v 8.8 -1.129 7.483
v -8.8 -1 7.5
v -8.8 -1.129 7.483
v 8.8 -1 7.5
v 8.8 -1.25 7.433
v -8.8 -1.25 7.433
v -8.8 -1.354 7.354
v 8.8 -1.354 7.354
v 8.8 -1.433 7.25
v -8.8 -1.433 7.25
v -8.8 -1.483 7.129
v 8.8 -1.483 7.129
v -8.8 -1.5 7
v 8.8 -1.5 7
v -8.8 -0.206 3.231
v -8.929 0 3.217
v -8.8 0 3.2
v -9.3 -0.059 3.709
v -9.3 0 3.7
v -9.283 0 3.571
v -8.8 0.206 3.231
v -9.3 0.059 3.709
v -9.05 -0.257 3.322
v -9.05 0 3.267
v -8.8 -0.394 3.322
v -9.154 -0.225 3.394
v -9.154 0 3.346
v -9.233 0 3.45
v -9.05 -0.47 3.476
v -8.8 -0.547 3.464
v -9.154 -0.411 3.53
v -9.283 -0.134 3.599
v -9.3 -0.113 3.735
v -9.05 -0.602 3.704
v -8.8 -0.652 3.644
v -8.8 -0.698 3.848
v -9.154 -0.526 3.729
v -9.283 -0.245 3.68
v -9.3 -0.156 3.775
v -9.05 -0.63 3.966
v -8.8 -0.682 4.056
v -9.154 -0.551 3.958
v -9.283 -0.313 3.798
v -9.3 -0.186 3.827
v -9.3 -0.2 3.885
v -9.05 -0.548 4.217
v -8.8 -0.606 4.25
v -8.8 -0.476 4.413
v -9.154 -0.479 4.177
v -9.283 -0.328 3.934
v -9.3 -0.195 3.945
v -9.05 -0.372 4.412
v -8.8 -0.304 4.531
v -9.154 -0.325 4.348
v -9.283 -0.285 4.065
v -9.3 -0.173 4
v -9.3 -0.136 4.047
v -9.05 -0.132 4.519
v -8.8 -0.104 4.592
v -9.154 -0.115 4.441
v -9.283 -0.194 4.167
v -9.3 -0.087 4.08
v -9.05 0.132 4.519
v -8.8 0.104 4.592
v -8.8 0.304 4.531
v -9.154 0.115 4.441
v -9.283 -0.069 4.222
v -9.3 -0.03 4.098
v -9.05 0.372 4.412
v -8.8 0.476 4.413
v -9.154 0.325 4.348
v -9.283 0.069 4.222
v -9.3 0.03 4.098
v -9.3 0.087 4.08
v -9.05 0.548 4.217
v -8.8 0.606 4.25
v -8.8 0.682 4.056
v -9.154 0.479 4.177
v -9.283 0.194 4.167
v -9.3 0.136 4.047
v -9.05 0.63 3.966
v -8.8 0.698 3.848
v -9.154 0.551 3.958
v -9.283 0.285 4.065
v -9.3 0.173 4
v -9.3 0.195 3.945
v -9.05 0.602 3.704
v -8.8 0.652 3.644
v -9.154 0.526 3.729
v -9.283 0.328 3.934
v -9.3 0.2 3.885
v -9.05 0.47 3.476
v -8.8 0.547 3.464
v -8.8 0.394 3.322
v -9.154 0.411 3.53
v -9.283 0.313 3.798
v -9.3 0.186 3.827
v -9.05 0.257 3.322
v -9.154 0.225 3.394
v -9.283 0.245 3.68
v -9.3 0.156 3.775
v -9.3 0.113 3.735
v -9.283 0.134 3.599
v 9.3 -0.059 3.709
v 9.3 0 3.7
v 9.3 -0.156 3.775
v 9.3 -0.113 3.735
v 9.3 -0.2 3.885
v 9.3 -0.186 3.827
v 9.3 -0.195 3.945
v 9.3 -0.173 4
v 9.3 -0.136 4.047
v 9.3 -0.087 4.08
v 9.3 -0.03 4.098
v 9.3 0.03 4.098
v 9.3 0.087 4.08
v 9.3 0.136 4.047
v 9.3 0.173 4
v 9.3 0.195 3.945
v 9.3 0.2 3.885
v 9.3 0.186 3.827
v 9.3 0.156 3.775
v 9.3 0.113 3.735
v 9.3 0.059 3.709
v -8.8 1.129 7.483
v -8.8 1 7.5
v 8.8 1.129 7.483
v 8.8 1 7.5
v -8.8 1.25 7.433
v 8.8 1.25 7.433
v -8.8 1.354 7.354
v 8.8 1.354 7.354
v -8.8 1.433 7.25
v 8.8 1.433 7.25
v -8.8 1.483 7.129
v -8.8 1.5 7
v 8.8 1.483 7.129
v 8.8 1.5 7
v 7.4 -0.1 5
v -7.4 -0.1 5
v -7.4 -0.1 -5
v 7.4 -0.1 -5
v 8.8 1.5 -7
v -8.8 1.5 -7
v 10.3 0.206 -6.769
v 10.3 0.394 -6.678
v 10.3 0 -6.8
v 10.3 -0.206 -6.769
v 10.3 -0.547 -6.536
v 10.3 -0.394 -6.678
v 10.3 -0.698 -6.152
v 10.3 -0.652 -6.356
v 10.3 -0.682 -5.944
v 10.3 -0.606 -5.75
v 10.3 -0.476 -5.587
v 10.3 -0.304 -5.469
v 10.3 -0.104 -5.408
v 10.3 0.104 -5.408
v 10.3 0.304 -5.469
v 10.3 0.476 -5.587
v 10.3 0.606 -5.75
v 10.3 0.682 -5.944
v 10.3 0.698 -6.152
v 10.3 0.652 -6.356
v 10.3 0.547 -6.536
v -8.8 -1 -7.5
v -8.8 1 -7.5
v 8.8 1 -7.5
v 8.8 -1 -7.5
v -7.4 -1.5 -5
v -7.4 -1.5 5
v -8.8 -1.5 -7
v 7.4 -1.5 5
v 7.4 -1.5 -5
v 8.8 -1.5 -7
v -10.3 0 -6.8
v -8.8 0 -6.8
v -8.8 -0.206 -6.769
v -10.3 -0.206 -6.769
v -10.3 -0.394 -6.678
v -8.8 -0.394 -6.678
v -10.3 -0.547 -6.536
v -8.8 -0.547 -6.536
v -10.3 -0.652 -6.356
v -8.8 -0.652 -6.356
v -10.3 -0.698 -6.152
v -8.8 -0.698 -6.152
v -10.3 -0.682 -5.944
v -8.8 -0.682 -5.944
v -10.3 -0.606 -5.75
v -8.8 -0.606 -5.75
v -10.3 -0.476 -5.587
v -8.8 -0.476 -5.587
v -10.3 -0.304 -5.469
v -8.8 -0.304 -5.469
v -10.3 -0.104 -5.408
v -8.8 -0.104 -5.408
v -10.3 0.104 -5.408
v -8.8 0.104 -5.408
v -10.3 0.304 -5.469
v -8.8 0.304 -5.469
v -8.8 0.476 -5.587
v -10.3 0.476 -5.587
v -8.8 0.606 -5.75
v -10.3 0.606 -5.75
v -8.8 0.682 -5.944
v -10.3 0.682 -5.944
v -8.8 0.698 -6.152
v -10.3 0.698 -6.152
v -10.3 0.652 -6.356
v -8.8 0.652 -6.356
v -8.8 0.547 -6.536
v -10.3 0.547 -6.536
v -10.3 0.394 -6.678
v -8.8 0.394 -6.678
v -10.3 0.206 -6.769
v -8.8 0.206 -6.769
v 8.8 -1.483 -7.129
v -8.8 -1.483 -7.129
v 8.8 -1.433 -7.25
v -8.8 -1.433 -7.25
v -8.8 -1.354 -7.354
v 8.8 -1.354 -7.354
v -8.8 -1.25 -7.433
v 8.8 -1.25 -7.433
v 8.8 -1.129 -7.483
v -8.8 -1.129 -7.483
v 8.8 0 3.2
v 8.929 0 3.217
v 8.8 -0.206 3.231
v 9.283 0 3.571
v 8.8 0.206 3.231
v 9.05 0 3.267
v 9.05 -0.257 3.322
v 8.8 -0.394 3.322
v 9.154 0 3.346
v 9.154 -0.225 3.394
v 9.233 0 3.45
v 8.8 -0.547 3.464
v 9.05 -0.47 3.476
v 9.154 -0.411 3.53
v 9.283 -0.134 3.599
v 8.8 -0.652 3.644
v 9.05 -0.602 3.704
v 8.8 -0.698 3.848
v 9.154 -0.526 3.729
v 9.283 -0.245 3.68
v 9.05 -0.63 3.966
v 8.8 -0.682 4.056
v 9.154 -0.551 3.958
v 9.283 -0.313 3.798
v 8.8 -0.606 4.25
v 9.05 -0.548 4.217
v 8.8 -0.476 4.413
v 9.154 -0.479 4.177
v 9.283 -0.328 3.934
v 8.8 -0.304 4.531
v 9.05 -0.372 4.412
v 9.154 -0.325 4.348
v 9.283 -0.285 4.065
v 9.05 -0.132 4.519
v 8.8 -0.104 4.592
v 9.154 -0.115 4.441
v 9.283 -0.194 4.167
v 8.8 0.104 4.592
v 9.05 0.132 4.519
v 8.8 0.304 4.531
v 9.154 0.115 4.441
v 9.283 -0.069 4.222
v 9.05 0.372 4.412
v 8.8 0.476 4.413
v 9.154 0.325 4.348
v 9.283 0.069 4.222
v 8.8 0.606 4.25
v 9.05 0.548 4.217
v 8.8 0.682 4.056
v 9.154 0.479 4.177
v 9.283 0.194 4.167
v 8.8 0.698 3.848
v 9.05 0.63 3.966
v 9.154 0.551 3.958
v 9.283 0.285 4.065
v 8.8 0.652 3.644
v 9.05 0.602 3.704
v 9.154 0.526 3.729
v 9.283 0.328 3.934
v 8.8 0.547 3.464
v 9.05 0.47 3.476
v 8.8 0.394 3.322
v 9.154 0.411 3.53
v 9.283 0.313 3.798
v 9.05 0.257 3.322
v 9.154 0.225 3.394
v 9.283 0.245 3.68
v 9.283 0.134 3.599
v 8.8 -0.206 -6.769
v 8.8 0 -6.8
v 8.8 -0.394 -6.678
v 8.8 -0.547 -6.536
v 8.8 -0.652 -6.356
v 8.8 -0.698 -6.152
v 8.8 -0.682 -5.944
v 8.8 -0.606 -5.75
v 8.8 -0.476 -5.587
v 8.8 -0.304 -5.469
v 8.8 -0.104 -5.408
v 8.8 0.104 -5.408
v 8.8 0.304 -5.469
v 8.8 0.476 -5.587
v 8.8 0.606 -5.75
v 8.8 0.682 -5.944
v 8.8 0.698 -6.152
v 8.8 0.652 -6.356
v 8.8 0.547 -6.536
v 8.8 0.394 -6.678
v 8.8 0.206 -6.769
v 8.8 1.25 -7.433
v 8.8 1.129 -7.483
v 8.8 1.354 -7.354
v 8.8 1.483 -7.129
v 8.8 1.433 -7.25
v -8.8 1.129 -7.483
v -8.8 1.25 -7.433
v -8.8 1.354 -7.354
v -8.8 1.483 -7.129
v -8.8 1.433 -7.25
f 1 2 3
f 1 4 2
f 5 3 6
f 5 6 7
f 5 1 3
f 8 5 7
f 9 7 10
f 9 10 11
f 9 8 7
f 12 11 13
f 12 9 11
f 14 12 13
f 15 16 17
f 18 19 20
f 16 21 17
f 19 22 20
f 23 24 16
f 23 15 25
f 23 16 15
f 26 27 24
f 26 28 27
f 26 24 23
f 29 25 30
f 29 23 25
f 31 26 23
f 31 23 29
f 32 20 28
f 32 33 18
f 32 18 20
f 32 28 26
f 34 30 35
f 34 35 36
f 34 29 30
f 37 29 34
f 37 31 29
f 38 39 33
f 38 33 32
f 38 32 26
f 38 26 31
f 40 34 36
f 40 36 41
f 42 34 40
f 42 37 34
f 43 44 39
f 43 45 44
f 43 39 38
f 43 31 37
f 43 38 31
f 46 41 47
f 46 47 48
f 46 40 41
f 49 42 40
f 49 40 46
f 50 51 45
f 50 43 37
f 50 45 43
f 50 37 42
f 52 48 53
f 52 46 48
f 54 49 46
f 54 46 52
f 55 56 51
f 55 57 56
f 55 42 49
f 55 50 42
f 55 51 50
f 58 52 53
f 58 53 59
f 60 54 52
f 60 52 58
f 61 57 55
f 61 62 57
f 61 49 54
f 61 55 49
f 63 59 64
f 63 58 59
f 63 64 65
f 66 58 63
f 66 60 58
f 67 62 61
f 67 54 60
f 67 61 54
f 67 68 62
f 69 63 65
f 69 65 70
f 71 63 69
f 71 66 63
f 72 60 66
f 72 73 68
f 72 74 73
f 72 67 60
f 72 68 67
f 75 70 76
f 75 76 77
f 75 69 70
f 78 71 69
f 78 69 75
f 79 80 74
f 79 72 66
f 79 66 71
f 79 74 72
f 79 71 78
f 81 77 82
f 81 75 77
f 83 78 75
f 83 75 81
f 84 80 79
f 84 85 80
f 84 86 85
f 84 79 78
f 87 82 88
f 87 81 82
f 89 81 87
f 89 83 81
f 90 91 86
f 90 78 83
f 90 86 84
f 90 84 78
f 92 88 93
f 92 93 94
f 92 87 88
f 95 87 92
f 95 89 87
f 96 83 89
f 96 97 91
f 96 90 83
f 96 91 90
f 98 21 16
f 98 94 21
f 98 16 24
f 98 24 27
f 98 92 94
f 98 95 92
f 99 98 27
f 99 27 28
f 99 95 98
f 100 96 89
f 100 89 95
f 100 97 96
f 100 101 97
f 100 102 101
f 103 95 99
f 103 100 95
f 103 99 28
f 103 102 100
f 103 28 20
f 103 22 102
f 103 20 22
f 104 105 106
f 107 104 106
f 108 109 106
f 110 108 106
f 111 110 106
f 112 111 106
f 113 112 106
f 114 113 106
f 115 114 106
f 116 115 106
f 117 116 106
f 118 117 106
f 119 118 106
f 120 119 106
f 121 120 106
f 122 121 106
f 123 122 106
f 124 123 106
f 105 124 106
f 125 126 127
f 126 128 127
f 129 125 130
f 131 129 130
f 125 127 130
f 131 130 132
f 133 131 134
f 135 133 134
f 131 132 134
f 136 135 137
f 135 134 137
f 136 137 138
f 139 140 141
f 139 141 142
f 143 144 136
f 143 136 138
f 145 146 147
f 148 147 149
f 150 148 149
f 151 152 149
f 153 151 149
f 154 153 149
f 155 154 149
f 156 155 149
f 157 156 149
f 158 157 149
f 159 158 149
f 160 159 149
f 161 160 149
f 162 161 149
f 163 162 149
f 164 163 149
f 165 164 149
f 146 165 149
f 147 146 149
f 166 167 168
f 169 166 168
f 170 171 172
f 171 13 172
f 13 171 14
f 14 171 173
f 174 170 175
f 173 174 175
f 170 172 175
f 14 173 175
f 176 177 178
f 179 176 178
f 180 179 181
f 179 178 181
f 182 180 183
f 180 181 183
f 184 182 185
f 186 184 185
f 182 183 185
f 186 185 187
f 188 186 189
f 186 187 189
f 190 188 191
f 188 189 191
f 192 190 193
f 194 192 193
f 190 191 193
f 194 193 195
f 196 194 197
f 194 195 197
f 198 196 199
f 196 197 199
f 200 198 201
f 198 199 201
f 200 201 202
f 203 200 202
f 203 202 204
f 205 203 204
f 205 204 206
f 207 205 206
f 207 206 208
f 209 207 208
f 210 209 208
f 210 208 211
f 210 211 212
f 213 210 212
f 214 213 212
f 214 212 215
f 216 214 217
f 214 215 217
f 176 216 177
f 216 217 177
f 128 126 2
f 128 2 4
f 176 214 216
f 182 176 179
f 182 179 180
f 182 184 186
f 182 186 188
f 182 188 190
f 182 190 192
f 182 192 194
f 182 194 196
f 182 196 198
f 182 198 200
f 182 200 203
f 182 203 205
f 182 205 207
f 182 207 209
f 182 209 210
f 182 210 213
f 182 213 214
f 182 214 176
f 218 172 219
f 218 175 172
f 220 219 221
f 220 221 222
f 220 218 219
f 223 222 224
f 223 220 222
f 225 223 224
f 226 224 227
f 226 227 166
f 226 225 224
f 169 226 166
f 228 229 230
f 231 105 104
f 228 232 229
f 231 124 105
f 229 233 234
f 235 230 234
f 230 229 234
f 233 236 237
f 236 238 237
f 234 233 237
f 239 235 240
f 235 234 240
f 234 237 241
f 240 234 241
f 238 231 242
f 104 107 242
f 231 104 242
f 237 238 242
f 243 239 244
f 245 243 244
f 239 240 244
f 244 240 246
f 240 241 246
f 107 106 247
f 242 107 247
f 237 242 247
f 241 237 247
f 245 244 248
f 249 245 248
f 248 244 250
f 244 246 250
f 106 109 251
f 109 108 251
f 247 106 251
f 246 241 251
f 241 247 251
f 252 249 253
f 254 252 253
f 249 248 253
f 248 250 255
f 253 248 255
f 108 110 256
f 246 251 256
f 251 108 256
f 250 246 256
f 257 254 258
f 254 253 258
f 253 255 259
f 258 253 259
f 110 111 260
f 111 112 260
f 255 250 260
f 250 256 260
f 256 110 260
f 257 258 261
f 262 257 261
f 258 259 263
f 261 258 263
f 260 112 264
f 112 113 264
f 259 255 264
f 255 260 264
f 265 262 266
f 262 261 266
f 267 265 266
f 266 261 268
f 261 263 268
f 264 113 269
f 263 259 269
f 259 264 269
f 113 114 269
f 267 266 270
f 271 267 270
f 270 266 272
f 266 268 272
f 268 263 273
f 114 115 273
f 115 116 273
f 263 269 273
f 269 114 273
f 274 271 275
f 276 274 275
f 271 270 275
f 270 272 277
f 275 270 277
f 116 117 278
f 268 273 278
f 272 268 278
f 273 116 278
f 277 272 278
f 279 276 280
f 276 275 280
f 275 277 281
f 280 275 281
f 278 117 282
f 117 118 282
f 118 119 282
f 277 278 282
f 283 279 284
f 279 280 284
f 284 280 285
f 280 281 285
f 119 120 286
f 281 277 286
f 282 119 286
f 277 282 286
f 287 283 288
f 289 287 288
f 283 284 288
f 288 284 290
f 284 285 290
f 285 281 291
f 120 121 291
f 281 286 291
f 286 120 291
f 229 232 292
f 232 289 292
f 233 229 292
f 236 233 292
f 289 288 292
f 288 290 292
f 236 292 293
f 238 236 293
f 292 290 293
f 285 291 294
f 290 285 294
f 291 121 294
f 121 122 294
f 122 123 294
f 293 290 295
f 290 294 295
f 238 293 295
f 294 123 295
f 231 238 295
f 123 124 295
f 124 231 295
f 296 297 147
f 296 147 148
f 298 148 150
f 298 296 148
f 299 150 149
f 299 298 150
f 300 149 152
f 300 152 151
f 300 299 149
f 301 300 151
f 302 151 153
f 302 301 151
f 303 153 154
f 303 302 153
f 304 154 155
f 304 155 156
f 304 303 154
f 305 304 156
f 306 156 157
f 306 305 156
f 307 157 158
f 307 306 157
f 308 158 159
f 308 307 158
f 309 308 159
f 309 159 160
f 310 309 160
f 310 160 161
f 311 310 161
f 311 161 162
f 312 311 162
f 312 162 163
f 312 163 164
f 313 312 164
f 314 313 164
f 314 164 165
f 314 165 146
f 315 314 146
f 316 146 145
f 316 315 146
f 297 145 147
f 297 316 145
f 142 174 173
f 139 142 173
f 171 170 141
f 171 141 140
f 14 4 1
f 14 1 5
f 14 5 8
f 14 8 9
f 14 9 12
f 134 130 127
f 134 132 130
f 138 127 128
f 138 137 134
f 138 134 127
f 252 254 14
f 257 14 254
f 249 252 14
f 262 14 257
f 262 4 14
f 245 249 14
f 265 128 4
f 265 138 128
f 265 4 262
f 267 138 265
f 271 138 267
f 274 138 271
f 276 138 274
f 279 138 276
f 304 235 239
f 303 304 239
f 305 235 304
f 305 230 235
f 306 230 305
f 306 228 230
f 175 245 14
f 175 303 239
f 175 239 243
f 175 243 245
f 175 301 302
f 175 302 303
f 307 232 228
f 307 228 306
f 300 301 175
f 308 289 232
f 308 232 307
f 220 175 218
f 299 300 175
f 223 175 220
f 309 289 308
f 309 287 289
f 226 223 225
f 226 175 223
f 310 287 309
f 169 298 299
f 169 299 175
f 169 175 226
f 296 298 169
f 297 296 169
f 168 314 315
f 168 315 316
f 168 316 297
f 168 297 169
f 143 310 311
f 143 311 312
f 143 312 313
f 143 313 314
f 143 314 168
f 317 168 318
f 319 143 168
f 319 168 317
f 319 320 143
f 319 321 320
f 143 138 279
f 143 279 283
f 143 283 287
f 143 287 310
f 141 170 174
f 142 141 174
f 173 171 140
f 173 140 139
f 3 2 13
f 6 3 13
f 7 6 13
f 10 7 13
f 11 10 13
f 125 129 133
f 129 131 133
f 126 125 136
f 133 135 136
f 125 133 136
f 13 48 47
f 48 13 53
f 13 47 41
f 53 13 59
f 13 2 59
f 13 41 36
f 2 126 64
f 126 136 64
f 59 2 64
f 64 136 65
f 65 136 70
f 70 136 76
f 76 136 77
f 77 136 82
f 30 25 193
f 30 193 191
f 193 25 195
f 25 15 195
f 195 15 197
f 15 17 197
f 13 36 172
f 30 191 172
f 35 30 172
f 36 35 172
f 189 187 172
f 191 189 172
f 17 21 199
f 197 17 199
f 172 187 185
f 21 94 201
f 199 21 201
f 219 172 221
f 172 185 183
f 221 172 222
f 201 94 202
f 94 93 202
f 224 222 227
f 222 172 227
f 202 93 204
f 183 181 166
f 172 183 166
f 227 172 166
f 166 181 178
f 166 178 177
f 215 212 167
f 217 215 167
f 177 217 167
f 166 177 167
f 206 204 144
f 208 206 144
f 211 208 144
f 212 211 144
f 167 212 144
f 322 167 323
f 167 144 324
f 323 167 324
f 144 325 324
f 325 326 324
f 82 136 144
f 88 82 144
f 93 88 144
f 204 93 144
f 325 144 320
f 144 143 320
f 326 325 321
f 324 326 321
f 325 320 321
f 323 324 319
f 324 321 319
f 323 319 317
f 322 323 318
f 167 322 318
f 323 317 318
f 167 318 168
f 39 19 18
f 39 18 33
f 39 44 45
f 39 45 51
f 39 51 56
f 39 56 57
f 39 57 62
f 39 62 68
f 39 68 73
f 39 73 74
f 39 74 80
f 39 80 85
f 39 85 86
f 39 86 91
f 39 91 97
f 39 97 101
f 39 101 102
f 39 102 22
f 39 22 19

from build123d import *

# Parameters (mm, degrees)
SKETCH1_W            = 17.6
SKETCH1_H            = 15
BOSS_EXTRUDE1_DEPTH  = 1.5
SKETCH2_W            = 14.8
SKETCH2_H            = 10
CUT_EXTRUDE1_DEPTH   = 1.4
SKETCH3_R            = 0.7
BOSS_EXTRUDE2_DEPTH  = 1.5
SKETCH4_R            = 0.7
BOSS_EXTRUDE3_DEPTH  = 0.5
FILLET2_R            = 0.5
FILLET2_OF_MIRROR1_R = 0.5
FILLET1_R            = 0.5


with BuildPart() as part:
    # Sketch1 → Boss-Extrude1 (new, symmetric)
    with BuildSketch(Plane(origin=(0, 0, 0), x_dir=(1, 0, 0), z_dir=(0, 1, 0))):
        Rectangle(SKETCH1_W, SKETCH1_H)
    extrude(amount=BOSS_EXTRUDE1_DEPTH, both=True)

    # Sketch2 → Cut-Extrude1 (cut)
    with BuildSketch(Plane.XZ.offset(1.5)):
        Rectangle(SKETCH2_W, SKETCH2_H)
    extrude(amount=-CUT_EXTRUDE1_DEPTH, mode=Mode.SUBTRACT)

    # Sketch3 → Boss-Extrude2 (add)
    with BuildSketch(Plane.ZY.offset(8.8)):
        with Locations(Location((-6.1, 0, 0), (0, 0, 180))):
            Circle(SKETCH3_R)
    boss_extrude2 = extrude(amount=BOSS_EXTRUDE2_DEPTH)

    # Sketch4 → Boss-Extrude3 (add)
    with BuildSketch(Plane.ZY.offset(8.8)):
        with Locations(Location((3.9, 0, 0), (0, 0, 180))):
            Circle(SKETCH4_R)
    boss_extrude3 = extrude(amount=BOSS_EXTRUDE3_DEPTH)

    # Fillet2
    fillet2_edges = [part.edges().sort_by_distance(p)[0] for p in [
        (-9.3, 0, 4.6),
    ]]
    fillet(fillet2_edges, radius=FILLET2_R - 0.0001)  # a hair under: the kernel refuses the full size

    # Mirror1: Boss-Extrude2, Boss-Extrude3 across plane
    add(boss_extrude2.mirror(Plane(origin=(0, 0, 0), x_dir=(0, 0, 1), z_dir=(1, 0, 0))))
    add(boss_extrude3.mirror(Plane(origin=(0, 0, 0), x_dir=(0, 0, 1), z_dir=(1, 0, 0))))

    # Fillet2 of Mirror1
    fillet2_of_mirror1_edges = [part.edges().sort_by_distance(p)[0] for p in [
        (9.3, 0, 4.6),
    ]]
    fillet(fillet2_of_mirror1_edges, radius=FILLET2_OF_MIRROR1_R - 0.0001)  # a hair under: the kernel refuses the full size

    # Fillet1
    fillet1_edges = [part.edges().sort_by_distance(p)[0] for p in [
        (0, 1.5, 7.5),
        (0, -1.5, 7.5),
        (0, -1.5, -7.5),
        (0, 1.5, -7.5),
    ]]
    fillet(fillet1_edges, radius=FILLET1_R)


solid = part.part
